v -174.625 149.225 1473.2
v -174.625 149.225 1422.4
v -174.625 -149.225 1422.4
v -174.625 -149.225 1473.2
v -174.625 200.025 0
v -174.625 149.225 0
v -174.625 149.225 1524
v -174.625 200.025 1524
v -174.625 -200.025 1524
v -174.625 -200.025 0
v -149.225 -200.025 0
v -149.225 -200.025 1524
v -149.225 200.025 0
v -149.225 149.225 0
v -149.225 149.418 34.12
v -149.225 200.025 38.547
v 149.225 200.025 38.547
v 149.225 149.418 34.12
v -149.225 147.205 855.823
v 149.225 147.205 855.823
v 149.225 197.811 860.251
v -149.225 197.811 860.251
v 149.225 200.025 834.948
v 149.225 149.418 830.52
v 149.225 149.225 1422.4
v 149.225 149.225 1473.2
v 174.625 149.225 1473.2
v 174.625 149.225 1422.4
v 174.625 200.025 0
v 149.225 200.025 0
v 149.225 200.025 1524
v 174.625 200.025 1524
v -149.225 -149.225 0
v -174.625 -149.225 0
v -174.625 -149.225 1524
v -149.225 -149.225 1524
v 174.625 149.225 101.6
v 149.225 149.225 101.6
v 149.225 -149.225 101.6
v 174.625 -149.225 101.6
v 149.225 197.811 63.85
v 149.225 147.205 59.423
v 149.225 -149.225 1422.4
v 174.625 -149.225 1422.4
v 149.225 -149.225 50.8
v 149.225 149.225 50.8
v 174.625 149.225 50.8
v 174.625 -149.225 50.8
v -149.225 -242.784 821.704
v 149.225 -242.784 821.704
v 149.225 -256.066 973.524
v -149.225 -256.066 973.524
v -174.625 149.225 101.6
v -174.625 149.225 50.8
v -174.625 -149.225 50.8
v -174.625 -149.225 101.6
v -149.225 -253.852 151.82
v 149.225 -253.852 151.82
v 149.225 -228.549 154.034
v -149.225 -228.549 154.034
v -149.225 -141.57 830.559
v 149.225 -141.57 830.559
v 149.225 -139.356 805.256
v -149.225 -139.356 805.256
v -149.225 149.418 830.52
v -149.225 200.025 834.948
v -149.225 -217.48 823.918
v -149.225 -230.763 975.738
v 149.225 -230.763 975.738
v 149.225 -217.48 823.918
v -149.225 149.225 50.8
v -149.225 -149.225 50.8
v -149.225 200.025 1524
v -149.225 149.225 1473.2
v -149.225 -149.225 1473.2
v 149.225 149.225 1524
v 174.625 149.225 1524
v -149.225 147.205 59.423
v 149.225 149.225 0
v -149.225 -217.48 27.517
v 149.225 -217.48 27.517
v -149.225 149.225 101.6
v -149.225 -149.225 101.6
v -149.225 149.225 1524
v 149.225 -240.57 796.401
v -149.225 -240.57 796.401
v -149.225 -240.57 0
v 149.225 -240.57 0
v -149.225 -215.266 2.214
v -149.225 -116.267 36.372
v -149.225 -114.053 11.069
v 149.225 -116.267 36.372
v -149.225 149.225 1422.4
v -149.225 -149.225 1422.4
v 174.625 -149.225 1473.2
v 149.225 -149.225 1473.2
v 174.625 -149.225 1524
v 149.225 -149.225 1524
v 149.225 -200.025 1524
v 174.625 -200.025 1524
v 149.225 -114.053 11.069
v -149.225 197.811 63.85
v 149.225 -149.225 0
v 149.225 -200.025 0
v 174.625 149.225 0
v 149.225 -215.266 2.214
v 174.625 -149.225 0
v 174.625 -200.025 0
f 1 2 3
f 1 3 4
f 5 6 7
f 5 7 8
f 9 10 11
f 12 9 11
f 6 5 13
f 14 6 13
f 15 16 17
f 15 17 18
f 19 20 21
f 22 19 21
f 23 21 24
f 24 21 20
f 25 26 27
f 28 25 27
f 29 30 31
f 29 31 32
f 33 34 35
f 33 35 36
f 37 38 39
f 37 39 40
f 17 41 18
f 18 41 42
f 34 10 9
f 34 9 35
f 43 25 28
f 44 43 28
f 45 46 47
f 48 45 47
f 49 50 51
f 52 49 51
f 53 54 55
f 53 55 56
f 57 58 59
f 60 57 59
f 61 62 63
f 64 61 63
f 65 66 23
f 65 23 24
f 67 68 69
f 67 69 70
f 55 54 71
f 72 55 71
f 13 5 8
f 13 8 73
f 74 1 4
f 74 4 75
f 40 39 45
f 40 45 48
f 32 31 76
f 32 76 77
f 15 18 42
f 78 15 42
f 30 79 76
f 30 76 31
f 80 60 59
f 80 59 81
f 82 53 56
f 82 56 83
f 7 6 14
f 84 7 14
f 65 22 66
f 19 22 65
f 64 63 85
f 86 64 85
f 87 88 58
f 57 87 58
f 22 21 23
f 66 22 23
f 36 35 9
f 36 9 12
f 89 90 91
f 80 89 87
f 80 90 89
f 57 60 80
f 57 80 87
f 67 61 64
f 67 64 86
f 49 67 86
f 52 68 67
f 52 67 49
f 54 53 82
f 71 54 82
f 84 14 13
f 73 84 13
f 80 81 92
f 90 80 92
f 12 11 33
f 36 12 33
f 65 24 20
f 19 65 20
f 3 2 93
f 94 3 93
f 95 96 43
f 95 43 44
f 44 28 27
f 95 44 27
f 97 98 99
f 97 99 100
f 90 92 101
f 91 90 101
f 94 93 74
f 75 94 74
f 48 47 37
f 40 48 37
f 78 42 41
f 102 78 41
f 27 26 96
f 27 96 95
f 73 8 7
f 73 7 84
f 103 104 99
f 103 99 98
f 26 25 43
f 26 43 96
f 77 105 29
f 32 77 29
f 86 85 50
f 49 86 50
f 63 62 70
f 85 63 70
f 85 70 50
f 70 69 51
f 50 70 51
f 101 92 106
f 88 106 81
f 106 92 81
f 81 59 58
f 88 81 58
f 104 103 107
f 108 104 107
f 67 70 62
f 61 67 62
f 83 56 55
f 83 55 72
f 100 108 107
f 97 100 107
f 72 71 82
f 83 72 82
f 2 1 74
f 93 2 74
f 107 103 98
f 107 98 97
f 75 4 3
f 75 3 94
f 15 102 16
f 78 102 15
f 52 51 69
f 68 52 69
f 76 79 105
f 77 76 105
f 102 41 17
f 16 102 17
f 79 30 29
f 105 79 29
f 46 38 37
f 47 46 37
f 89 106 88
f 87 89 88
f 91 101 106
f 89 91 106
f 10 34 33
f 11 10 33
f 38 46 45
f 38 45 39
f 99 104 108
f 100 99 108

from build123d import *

# Parameters (mm, degrees)
F0_W     = 25.4
F0_H     = 50.8
F1_DEPTH = 1524
F2_W     = 25.4
F2_H     = 50.8
F3_DEPTH = 298.45
F6_DEPTH = 298.45


with BuildPart() as f1:
    # F0 (on Top) → F1 (new body)
    with BuildSketch(Plane.XY):
        with Locations((-161.925, 174.625)):
            Rectangle(F0_W, F0_H)
        with Locations((161.925, 174.625)):
            Rectangle(F0_W, F0_H)
        with Locations((161.925, -174.625)):
            Rectangle(F0_W, F0_H)
        with Locations((-161.925, -174.625)):
            Rectangle(F0_W, F0_H)
    extrude(amount=F1_DEPTH)


with BuildPart() as f3:
    # F2 (on face) → F3 (new body, through all)
    with BuildSketch(Plane.XZ.offset(-149.225)):
        with Locations((161.925, 1447.8)):
            Rectangle(F2_W, F2_H)
        with Locations((-161.925, 1447.8)):
            Rectangle(F2_W, F2_H)
        with Locations((161.925, 76.2)):
            Rectangle(F2_W, F2_H)
        with Locations((-161.925, 76.2)):
            Rectangle(F2_W, F2_H)
    extrude(amount=F3_DEPTH)


with BuildPart() as f6:
    # F5 (on face) → F6 (new body, through all)
    with BuildSketch(Plane(origin=(149.225, 0, 0), x_dir=(0, -1, 0), z_dir=(-1, 0, 0))):
        Polygon((-147.204553, 855.823441), (-197.811244, 860.250952), (-200.025, 834.947607), (-149.418309, 830.520095), align=None)
        Polygon((217.480198, 823.917659), (141.570162, 830.558927), (139.356406, 805.255581), (240.569787, 796.400558), (242.783543, 821.703903), align=None)
        Polygon((230.762733, 975.737731), (217.480198, 823.917659), (242.783543, 821.703903), (256.066078, 973.523975), align=None)
        Polygon((217.48007, 27.517101), (116.266689, 36.372125), (114.052933, 11.068779), (215.266314, 2.213756), align=None)
        Polygon((228.548849, 154.033828), (217.48007, 27.517101), (215.266314, 2.213756), (240.569659, 0), (253.852195, 151.820072), align=None)
        Polygon((-197.811244, 63.850383), (-200.025, 38.547038), (-149.418309, 34.119526), (-147.204553, 59.422872), align=None)
    extrude(amount=F6_DEPTH)


solid = Compound([f1.part, f3.part, f6.part])
